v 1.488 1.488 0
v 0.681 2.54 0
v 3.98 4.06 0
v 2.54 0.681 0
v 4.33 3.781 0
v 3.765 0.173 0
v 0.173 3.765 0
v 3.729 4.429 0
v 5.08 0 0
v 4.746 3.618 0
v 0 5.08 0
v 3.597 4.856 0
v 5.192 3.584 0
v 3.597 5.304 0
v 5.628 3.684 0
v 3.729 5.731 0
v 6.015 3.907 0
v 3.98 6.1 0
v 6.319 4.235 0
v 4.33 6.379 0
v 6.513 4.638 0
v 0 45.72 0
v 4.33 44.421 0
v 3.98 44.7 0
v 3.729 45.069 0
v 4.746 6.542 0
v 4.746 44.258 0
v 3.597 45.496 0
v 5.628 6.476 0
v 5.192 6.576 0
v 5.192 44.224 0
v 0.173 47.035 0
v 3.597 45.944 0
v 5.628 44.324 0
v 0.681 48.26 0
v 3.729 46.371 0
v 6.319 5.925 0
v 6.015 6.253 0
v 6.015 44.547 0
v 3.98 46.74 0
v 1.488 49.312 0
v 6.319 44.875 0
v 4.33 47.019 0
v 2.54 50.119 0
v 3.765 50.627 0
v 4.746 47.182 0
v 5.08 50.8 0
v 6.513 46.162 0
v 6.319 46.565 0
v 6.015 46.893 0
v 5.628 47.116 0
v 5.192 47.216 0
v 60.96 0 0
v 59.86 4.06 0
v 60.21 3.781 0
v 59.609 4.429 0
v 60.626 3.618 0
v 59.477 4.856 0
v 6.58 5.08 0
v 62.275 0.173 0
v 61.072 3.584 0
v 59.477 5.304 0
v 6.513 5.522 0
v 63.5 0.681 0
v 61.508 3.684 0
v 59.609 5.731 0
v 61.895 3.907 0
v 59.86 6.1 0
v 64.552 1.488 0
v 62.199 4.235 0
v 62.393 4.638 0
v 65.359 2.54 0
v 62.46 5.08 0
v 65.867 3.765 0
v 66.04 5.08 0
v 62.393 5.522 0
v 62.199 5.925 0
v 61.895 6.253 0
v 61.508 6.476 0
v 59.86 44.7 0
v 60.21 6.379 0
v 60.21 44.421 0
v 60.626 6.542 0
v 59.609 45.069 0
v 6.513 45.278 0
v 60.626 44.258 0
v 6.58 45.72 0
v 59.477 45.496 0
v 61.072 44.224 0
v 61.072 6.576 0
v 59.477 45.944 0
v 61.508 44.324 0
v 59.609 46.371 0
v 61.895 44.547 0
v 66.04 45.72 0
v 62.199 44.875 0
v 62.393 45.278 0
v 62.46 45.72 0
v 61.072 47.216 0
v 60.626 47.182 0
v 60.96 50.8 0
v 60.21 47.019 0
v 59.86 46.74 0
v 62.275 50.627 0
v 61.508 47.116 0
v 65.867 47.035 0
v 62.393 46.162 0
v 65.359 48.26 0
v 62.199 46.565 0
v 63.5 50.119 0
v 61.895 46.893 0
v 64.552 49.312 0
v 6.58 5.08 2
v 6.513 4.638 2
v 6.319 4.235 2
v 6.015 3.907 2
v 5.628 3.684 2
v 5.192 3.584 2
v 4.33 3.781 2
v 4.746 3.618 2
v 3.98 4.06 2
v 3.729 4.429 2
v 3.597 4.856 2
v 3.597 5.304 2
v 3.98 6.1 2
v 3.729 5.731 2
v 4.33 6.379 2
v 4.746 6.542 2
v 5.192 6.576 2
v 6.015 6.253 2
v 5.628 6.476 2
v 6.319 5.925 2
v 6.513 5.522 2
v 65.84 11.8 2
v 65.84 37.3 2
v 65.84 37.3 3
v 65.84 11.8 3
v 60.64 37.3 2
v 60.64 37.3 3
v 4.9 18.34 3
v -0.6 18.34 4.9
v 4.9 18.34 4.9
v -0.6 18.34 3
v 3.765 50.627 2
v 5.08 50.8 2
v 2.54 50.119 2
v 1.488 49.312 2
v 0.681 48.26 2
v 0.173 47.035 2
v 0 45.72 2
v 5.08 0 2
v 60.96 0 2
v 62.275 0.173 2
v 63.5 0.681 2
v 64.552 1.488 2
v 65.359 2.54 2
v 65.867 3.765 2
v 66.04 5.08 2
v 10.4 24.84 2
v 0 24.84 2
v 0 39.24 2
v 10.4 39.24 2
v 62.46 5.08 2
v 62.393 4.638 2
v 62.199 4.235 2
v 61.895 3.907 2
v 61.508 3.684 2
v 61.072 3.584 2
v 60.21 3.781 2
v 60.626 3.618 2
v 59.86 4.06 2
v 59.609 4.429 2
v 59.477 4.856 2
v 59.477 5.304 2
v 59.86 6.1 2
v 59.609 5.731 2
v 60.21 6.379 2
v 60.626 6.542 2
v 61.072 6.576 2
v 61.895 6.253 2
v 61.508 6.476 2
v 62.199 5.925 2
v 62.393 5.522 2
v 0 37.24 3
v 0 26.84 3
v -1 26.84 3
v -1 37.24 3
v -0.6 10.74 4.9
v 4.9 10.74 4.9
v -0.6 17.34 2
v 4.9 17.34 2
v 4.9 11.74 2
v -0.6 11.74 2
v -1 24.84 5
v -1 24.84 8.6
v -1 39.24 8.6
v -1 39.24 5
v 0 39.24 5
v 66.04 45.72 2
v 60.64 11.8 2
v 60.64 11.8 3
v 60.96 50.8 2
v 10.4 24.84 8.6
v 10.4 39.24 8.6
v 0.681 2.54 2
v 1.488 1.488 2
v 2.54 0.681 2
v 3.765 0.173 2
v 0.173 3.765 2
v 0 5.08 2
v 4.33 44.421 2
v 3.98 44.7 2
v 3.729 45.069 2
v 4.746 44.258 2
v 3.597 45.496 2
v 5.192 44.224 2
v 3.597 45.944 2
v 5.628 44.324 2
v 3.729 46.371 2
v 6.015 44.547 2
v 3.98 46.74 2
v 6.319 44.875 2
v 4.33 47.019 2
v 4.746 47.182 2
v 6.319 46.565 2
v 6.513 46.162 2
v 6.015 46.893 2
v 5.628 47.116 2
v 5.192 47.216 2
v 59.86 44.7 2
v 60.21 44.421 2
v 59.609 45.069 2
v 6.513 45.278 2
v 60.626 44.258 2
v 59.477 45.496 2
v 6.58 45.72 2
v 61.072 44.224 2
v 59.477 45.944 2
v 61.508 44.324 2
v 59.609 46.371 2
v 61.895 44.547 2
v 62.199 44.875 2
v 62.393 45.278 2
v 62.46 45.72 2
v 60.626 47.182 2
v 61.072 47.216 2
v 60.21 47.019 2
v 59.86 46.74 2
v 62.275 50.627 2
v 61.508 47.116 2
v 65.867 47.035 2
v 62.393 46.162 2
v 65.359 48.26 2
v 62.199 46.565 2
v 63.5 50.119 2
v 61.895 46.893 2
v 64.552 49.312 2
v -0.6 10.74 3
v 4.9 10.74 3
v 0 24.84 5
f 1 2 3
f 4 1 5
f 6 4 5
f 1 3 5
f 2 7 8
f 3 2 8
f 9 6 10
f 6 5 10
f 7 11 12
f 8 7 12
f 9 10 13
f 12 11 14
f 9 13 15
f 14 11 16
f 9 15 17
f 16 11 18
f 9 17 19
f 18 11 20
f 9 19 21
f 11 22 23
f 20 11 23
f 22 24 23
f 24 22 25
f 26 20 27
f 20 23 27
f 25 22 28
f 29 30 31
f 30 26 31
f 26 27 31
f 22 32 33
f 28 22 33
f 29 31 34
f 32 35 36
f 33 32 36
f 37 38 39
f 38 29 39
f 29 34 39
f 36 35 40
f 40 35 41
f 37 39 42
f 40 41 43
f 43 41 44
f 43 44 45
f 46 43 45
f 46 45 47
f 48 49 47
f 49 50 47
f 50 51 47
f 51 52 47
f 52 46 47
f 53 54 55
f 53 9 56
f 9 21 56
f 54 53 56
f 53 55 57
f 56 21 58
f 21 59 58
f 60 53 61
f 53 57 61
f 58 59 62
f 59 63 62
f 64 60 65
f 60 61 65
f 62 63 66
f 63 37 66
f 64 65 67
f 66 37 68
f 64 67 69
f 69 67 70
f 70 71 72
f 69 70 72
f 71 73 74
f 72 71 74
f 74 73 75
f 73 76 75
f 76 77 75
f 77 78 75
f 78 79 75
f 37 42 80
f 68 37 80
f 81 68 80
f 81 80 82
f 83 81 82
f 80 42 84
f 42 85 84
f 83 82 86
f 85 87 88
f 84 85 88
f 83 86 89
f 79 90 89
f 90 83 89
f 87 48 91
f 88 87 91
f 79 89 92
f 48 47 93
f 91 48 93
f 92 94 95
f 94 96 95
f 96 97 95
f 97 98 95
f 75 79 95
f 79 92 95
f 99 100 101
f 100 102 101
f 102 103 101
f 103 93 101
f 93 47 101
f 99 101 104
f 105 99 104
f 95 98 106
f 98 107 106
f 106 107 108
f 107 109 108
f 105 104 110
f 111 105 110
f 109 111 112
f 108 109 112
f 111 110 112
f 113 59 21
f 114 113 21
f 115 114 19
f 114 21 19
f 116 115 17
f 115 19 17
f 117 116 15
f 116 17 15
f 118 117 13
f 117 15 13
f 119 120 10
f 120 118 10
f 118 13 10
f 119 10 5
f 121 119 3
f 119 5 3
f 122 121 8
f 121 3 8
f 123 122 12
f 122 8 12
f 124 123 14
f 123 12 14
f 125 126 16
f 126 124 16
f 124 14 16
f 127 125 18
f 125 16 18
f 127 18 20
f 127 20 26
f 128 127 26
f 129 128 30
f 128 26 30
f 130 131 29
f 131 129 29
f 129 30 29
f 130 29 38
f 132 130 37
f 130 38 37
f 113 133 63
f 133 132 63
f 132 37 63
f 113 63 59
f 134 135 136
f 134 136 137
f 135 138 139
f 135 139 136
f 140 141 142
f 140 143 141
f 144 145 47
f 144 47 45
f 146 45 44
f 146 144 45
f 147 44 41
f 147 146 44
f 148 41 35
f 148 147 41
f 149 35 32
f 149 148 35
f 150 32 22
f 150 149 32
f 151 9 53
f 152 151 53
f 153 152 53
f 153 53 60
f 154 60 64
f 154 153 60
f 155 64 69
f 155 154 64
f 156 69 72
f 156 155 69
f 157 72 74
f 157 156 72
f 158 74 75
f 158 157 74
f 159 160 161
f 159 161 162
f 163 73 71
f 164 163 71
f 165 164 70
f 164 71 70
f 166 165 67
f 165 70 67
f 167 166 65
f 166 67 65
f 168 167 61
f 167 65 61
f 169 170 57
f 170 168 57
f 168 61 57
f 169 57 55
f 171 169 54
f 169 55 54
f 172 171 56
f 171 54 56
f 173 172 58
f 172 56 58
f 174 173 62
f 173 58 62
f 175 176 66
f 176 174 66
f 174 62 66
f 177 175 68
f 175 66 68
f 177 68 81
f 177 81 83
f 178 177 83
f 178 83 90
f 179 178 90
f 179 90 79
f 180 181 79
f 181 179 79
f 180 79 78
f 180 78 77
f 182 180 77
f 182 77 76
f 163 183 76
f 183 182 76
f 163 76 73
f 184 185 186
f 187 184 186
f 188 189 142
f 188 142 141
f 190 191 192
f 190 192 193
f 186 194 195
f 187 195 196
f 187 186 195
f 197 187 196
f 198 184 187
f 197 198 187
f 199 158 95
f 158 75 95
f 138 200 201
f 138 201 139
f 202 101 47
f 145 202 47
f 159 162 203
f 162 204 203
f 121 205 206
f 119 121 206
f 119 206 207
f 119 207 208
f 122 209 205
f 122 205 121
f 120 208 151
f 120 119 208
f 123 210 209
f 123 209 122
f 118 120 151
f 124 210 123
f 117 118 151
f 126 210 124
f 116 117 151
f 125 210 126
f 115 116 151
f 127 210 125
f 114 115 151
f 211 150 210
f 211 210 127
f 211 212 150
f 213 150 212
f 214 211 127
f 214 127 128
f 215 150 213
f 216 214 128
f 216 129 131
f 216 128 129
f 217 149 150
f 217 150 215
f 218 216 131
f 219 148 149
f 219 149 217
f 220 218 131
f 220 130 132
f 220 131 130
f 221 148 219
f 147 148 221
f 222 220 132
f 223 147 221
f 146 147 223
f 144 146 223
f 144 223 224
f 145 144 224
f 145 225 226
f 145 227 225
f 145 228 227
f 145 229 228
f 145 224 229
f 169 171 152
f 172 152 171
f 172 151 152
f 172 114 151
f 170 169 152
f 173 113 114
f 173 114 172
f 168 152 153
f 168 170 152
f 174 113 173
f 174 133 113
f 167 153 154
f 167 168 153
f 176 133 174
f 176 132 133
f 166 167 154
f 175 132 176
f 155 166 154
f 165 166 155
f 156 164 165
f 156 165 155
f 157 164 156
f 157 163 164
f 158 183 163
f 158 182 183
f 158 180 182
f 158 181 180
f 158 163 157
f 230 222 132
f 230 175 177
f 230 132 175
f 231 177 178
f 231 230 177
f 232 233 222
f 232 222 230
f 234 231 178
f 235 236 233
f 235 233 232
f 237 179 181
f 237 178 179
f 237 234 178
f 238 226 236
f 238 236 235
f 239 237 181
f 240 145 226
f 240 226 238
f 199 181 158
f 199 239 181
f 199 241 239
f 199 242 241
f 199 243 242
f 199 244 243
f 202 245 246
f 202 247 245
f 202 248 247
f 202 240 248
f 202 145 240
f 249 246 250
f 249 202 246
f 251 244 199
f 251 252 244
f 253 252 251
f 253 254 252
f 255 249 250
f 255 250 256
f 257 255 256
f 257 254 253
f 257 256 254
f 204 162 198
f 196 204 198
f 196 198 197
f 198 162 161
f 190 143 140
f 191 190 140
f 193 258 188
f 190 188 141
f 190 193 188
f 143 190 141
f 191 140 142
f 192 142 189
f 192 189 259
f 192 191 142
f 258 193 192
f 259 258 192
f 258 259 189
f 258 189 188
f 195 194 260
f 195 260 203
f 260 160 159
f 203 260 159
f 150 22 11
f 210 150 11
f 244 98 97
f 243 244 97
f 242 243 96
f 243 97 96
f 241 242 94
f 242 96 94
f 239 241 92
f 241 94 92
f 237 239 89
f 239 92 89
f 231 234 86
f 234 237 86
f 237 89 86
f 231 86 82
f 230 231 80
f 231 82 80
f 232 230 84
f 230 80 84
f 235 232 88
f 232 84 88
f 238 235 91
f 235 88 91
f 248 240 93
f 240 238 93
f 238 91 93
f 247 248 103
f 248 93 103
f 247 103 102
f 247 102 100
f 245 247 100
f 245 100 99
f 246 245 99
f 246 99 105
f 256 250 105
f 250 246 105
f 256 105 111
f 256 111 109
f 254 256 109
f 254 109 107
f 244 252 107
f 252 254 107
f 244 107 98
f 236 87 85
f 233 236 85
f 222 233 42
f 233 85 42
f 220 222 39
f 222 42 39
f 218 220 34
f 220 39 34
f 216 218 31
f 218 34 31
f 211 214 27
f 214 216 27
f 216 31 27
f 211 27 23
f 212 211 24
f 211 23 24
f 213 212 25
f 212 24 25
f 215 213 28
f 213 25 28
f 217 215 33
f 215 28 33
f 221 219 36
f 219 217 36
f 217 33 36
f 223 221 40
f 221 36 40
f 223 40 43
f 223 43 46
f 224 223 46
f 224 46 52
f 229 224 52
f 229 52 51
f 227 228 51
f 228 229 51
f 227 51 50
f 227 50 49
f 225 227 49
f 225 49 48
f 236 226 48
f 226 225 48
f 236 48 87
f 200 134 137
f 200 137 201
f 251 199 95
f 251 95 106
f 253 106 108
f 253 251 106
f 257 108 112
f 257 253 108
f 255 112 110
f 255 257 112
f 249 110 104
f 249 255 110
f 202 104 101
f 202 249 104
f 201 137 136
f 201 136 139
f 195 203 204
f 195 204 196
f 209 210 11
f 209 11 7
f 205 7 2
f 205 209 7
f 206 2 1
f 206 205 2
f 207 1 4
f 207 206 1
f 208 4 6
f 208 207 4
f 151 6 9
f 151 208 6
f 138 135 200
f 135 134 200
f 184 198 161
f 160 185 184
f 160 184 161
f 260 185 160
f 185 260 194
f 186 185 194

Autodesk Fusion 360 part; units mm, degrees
sketch "PCB" plane through (0, 0, 0) normal (0, 0, 1) x (1, 0, 0)
  line L0 (0, 0) -> (66.04, 0)
  line L1 (66.04, 0) -> (66.04, 50.8)
  line L2 (66.04, 50.8) -> (0, 50.8)
  line L3 (0, 50.8) -> (0, 0)
  circle A0 centre (5.08, 45.72) radius 1.5
  line L4 (33.02, 50.8) -> (33.02, 0) construction
  line L5 (0, 25.4) -> (66.04, 25.4) construction
  circle A1 centre (60.96, 45.72) radius 1.5
  circle A2 centre (5.08, 5.08) radius 1.5
  circle A3 centre (60.96, 5.08) radius 1.5
  dimension "d1" = 66.04
  dimension "d2" = 50.8
  dimension "d3" = 3
  dimension "d4" = 5.08
  dimension "d5" = 45.72
extrude "Extrude1" add sketch "PCB" along normal blind 2 makes body 1
fillet "Fillet1" radius 5.08 4 edges at (66.04, 0, 1) (0, 0, 1) (0, 50.8, 1) (66.04, 50.8, 1) on bodies 1
sketch "hdmi usb" plane through (0, 0, 2) normal (0, 0, 1) x (-1, 0, 0)
  arc A0 (-66.04, -45.72) -> (-60.96, -50.8) centre (-60.96, -45.72) ccw
  line L0 (-60.96, -50.8) -> (-5.08, -50.8)
  arc A1 (-5.08, -50.8) -> (0, -45.72) centre (-5.08, -45.72) ccw
  line L1 (0, -45.72) -> (0, -5.08)
  arc A2 (0, -5.08) -> (-5.08, 0) centre (-5.08, -5.08) ccw
  line L2 (-5.08, 0) -> (-60.96, 0)
  arc A3 (-60.96, 0) -> (-66.04, -5.08) centre (-60.96, -5.08) ccw
  line L3 (-66.04, -5.08) -> (-66.04, -45.72)
  circle A4 centre (-60.96, -5.08) radius 1.5
  circle A5 centre (-60.96, -45.72) radius 1.5
  circle A6 centre (-5.08, -45.72) radius 1.5
  circle A7 centre (-5.08, -5.08) radius 1.5
  line L4 (1, -39.24) -> (-10.4, -39.24)
  line L5 (-10.4, -39.24) -> (-10.4, -24.84)
  line L6 (-10.4, -24.84) -> (1, -24.84)
  line L7 (1, -24.84) -> (1, -39.24)
  line L8 (0.6, -18.34) -> (-4.9, -18.34)
  line L9 (-4.9, -18.34) -> (-4.9, -10.74)
  line L10 (-4.9, -10.74) -> (0.6, -10.74)
  line L11 (0.6, -10.74) -> (0.6, -18.34)
  dimension "d9" = 11.4
  dimension "d10" = 14.4
  dimension "d11" = 1
  dimension "d12" = 11.56
  dimension "d13" = 5.5
  dimension "d14" = 7.6
  dimension "d15" = 0.6
  dimension "d16" = 6.5
extrude "Extrude2" add sketch "hdmi usb" along normal blind 5.6 from surface at 1 separate body contours L1 L4 L5 L6 | L1 L4 L6 L7 makes body 2
chamfer "Chamfer1" distance 2 angle 45 2 edges at (4.7, 24.84, 3) (4.7, 39.24, 3) on bodies 2
extrude "Extrude3" add sketch "hdmi usb" along normal blind 2.9 separate body contours L1 L8 L10 L11 | L1 L8 L9 L10 makes body 3
chamfer "Chamfer2" distance 1 angle 45 2 edges at (2.15, 18.34, 2) (2.15, 10.74, 2) on bodies 3
sketch "hdmi 2" plane through (0, 0, 3) normal (0, 0, -1) x (1, 0, 0)
  line L0 (-1, -37.24) -> (10.4, -37.24)
  line L1 (10.4, -37.24) -> (10.4, -26.84)
  line L2 (10.4, -26.84) -> (-1, -26.84)
  line L3 (-1, -26.84) -> (-1, -37.24)
  line L4 (0, -45.72) -> (0, -5.08)
  line L5 (-1, -24.84) -> (10.4, -24.84)
  line L6 (10.4, -24.84) -> (10.4, -39.24)
  line L7 (10.4, -39.24) -> (-1, -39.24)
  line L8 (-1, -39.24) -> (-1, -24.84)
extrude "Extrude4" add sketch "hdmi 2" along normal blind 1 contours L0 L1 L2 L4 L6 bodies 2
extrude "Extrude5" add sketch "hdmi 2" along normal blind -2.5 and the other way blind -1 contours L0 L4 L6 L7 | L2 L4 L5 L6 bodies 2
sketch "Sketch4" plane through (0, 0, 2) normal (0, 0, 1) x (-1, 0, 0)
  arc A0 (-66.04, -45.72) -> (-60.96, -50.8) centre (-60.96, -45.72) ccw
  line L0 (-60.96, -50.8) -> (-5.08, -50.8)
  arc A1 (-5.08, -50.8) -> (0, -45.72) centre (-5.08, -45.72) ccw
  line L1 (0, -45.72) -> (0, -5.08)
  arc A2 (0, -5.08) -> (-5.08, 0) centre (-5.08, -5.08) ccw
  line L2 (-5.08, 0) -> (-60.96, 0)
  arc A3 (-60.96, 0) -> (-66.04, -5.08) centre (-60.96, -5.08) ccw
  line L3 (-66.04, -5.08) -> (-66.04, -45.72)
  circle A4 centre (-60.96, -5.08) radius 1.5
  circle A5 centre (-60.96, -45.72) radius 1.5
  circle A6 centre (-5.08, -45.72) radius 1.5
  circle A7 centre (-5.08, -5.08) radius 1.5
  line L4 (-60.64, -37.3) -> (-65.84, -37.3)
  line L5 (-65.84, -37.3) -> (-65.84, -11.8)
  line L6 (-65.84, -11.8) -> (-60.64, -11.8)
  line L7 (-60.64, -11.8) -> (-60.64, -37.3)
  line L8 (-60.64, -24.55) -> (-65.84, -24.55) construction
  dimension "d30" = 25.5
  dimension "d31" = 24.55
  dimension "d32" = 0.2
  dimension "d33" = 5.2
extrude "Extrude6" add sketch "Sketch4" along normal blind 1 separate body contours L4 L5 L6 L7 makes body 4
